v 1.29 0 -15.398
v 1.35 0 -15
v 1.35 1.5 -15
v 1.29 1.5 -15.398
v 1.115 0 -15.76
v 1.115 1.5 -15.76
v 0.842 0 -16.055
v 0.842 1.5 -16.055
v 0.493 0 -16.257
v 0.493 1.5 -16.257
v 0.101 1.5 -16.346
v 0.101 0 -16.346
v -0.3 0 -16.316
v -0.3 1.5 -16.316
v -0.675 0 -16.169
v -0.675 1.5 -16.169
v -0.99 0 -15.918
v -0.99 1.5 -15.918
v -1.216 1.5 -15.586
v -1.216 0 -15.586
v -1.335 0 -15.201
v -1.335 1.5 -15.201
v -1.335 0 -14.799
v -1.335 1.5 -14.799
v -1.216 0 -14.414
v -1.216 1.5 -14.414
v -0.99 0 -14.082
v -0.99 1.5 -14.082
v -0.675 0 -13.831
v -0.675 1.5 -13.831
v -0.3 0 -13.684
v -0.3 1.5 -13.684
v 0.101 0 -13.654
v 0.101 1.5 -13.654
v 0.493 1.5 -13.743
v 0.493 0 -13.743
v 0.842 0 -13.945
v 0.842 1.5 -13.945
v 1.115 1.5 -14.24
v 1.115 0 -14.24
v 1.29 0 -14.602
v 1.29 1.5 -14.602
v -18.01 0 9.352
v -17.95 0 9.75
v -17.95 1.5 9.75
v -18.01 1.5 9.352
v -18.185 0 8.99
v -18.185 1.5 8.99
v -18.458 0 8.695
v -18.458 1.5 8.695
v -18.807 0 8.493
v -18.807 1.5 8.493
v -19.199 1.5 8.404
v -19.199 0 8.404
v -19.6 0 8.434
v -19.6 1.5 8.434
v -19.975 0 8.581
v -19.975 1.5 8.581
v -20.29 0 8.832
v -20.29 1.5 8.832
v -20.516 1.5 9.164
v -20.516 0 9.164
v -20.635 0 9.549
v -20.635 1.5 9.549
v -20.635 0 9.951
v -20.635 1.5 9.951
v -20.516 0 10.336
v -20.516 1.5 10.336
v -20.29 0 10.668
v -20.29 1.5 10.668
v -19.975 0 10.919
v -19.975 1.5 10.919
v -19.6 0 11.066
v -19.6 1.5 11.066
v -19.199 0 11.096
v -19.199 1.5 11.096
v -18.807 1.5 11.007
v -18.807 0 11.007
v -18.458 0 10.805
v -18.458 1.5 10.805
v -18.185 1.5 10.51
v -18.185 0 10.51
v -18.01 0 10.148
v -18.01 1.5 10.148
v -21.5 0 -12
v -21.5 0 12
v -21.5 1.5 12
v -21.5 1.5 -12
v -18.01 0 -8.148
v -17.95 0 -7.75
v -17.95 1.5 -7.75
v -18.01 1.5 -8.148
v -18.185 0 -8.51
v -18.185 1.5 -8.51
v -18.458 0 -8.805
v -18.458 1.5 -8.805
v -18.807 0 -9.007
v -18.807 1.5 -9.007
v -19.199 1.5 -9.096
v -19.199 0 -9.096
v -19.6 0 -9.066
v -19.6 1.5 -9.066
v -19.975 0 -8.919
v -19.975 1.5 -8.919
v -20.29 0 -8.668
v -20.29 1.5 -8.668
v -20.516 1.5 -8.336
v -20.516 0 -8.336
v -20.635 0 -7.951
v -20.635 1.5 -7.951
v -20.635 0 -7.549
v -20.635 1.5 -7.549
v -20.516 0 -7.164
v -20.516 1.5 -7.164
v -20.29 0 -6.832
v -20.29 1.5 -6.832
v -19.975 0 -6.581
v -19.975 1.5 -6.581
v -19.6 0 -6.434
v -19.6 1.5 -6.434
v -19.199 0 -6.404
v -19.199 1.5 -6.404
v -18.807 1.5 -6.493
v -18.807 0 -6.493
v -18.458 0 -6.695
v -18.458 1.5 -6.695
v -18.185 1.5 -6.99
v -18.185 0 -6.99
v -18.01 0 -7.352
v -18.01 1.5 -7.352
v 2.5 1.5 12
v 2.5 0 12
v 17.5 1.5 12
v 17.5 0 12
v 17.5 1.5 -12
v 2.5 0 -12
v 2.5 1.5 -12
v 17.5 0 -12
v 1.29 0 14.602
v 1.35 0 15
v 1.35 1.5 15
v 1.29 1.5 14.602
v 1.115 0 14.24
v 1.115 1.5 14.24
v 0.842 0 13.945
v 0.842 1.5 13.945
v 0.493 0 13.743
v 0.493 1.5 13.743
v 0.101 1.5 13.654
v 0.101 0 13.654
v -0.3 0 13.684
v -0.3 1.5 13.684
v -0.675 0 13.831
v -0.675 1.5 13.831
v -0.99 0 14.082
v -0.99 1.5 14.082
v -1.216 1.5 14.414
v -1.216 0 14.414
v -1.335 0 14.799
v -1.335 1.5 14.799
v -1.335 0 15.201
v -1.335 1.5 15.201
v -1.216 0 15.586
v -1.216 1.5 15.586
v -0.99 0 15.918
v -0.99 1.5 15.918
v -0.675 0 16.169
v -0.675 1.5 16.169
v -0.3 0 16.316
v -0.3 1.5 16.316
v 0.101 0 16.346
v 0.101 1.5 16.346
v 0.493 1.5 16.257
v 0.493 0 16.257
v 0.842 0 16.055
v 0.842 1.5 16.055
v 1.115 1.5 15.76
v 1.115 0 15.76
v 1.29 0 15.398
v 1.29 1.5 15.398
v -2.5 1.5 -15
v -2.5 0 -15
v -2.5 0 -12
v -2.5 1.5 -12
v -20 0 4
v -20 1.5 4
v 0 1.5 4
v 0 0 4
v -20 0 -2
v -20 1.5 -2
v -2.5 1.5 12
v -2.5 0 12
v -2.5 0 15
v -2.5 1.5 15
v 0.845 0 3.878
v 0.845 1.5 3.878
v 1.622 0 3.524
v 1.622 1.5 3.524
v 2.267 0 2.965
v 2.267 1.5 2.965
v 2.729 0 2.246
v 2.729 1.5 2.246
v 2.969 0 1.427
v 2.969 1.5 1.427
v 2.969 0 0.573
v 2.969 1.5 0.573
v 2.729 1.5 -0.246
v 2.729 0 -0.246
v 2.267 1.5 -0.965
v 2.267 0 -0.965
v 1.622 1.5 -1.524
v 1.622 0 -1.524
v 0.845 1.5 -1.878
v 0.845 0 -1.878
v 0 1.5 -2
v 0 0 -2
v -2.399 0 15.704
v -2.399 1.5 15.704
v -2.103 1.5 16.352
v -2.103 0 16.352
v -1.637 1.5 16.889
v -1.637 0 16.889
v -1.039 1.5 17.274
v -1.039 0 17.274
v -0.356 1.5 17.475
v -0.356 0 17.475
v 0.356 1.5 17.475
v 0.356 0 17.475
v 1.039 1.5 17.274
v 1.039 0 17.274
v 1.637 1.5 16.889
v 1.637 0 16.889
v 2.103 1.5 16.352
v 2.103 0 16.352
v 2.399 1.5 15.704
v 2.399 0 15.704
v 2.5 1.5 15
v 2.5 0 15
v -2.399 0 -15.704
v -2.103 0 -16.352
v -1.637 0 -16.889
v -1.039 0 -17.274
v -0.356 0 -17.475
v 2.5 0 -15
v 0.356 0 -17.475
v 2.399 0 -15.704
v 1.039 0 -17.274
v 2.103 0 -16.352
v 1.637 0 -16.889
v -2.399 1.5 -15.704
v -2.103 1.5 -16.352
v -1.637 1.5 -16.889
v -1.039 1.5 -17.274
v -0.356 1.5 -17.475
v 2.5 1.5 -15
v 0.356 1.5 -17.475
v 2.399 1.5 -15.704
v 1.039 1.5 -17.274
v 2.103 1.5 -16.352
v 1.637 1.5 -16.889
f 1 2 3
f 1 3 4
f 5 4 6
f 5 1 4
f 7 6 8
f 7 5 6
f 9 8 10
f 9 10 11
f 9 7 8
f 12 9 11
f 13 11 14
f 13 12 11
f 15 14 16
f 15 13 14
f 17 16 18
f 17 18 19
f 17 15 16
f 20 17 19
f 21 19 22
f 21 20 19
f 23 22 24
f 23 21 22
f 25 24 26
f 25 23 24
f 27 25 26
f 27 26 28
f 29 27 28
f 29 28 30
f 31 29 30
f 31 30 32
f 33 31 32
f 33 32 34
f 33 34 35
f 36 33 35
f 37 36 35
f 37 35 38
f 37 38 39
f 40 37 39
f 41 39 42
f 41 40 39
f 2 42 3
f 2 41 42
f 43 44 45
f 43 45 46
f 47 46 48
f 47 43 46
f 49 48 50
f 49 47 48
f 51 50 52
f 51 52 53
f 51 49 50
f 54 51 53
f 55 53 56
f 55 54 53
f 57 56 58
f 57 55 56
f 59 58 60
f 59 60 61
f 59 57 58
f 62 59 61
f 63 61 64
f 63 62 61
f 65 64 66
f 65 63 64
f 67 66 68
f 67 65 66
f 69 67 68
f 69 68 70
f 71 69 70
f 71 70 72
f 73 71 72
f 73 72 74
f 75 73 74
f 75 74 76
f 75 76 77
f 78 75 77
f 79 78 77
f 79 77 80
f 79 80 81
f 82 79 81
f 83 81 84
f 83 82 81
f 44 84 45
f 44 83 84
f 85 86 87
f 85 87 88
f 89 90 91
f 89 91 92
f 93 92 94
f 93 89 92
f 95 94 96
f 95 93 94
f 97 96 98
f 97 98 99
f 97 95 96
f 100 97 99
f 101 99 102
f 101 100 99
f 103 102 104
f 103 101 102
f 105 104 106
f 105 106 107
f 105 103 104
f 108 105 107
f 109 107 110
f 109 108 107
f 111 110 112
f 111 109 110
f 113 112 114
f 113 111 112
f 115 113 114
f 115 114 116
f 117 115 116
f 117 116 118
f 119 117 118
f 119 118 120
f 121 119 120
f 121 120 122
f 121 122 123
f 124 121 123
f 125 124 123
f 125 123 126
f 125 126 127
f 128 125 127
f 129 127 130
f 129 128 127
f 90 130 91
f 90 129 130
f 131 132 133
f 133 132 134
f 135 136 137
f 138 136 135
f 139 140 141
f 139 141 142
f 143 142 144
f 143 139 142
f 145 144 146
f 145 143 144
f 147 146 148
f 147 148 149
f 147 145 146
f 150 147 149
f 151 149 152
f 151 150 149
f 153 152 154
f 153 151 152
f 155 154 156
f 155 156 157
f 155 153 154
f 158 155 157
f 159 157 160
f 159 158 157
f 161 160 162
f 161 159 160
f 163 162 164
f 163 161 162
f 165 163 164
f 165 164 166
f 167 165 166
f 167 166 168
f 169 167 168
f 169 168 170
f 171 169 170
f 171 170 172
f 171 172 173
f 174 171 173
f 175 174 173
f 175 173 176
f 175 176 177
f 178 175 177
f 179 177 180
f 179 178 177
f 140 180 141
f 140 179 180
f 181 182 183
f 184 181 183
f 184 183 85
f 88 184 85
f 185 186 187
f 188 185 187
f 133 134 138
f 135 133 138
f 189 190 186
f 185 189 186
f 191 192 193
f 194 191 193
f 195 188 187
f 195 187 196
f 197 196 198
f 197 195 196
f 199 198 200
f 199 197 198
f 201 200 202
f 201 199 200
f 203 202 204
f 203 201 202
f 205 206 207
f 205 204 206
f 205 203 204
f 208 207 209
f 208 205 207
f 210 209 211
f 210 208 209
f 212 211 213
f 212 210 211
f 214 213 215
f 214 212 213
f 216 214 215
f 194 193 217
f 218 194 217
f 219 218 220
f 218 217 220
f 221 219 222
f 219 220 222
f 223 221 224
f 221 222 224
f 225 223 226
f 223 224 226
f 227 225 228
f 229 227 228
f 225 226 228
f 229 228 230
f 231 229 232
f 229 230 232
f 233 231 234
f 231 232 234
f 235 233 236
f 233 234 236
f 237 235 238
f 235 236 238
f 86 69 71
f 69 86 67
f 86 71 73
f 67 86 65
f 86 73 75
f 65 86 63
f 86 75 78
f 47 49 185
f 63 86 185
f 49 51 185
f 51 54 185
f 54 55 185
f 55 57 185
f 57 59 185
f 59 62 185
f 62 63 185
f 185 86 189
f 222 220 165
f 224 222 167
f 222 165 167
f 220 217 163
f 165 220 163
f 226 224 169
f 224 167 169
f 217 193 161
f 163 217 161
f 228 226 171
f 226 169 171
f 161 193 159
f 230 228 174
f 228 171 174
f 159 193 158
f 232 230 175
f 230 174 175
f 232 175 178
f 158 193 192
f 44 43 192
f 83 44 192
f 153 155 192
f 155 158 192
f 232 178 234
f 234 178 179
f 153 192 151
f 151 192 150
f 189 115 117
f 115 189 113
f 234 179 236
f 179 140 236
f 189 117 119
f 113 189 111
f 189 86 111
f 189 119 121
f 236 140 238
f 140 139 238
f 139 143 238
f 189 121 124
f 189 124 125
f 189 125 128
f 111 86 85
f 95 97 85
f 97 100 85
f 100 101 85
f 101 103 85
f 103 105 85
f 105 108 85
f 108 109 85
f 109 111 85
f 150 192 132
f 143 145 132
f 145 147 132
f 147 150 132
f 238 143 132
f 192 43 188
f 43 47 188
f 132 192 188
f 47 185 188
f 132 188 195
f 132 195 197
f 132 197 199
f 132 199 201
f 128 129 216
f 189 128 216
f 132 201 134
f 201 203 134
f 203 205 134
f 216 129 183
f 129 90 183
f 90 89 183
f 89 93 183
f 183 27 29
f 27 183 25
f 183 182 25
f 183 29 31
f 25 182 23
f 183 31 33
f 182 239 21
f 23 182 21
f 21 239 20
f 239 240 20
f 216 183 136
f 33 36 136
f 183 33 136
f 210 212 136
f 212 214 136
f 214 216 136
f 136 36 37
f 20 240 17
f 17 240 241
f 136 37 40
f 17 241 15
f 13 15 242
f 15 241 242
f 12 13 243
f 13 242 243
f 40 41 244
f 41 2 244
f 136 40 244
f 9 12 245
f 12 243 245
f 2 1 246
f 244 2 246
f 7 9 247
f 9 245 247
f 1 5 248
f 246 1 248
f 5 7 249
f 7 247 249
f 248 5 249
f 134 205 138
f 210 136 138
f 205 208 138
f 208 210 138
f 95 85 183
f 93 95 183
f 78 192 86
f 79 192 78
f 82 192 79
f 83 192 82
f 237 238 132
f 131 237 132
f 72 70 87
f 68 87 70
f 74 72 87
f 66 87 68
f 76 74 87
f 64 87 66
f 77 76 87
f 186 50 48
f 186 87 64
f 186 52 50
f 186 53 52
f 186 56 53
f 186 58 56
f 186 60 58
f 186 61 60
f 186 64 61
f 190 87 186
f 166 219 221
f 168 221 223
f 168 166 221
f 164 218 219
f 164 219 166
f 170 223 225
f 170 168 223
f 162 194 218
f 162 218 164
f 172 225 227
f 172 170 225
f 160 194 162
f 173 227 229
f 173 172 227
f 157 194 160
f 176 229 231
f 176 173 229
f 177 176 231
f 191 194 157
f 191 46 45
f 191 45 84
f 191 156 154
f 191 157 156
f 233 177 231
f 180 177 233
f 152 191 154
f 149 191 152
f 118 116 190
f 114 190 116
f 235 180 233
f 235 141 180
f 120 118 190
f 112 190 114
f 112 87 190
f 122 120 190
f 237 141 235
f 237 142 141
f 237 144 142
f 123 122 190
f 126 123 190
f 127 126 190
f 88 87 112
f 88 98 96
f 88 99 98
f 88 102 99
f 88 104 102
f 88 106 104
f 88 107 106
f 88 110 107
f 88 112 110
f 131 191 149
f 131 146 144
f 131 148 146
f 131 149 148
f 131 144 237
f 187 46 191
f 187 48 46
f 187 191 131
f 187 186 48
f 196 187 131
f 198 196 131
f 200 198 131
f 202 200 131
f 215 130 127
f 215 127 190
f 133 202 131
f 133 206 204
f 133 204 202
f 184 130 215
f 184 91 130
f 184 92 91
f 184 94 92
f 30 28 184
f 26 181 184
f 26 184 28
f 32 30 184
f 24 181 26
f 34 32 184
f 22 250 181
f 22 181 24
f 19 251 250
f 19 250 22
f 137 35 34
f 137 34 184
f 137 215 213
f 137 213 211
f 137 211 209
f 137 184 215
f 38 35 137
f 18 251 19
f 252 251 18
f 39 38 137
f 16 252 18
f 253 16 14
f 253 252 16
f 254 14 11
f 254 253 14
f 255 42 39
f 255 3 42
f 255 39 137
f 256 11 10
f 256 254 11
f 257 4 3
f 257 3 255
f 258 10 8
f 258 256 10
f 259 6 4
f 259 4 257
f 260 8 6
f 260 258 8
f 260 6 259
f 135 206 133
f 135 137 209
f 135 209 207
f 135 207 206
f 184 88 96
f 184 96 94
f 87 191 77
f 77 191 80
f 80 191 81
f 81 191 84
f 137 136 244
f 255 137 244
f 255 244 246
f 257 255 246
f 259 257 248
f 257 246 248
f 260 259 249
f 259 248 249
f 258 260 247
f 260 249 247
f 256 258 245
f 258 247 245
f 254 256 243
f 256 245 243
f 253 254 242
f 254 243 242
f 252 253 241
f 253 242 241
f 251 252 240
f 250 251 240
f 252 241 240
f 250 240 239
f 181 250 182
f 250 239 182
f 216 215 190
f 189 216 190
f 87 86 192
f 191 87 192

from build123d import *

# Parameters (mm, degrees)
SKETCH1_W           = 35
SKETCH1_H           = 24
SKETCH1_R           = 3
SKETCH1_R_2         = 2.5
SKETCH1_R_3         = 1.35
SKETCH1_W_2         = 4
BOSS_EXTRUDE1_DEPTH = 1.5
CUT_EXTRUDE1_DEPTH  = 10


with BuildPart() as part:
    # Sketch1 → Boss-Extrude1 (new body)
    with BuildSketch(Plane(origin=(0, 0, 0), x_dir=(1, 0, 0), z_dir=(0, 1, 0))):
        Rectangle(SKETCH1_W, SKETCH1_H)
        with Locations((0, -1)):
            Circle(SKETCH1_R, mode=Mode.SUBTRACT)
        with BuildLine():
            Line((2.5, -12), (-2.5, -12))
            Line((-2.5, -12), (-2.5, -15))
            ThreePointArc((-2.5, -15), (0, -12.5), (2.5, -15))
            Line((2.5, -15), (2.5, -12))
        make_face()
        with Locations((0, -15)):
            Circle(SKETCH1_R_2)
        with Locations((0, -15)):
            Circle(SKETCH1_R_3, mode=Mode.SUBTRACT)
        with BuildLine():
            Line((-2.5, 15), (-2.5, 12))
            Line((-2.5, 12), (2.5, 12))
            Line((2.5, 12), (2.5, 15))
            ThreePointArc((2.5, 15), (0, 12.5), (-2.5, 15))
        make_face()
        with Locations((0, 15)):
            Circle(SKETCH1_R_2)
        with Locations((0, 15)):
            Circle(SKETCH1_R_3, mode=Mode.SUBTRACT)
        with Locations((-19.5, 0)):
            Rectangle(SKETCH1_W_2, SKETCH1_H)
        with Locations((-19.3, 7.75)):
            Circle(SKETCH1_R_3, mode=Mode.SUBTRACT)
        with Locations((-19.3, -9.75)):
            Circle(SKETCH1_R_3, mode=Mode.SUBTRACT)
    extrude(amount=BOSS_EXTRUDE1_DEPTH)

    # Sketch2 → Cut-Extrude1 (cut)
    with BuildSketch(Plane(origin=(0, 1.5, 0), x_dir=(1, 0, 0), z_dir=(0, 1, 0))):
        with BuildLine():
            Line((0, 2), (-20, 2))
            Line((-20, 2), (-20, -4))
            Line((-20, -4), (0, -4))
            ThreePointArc((0, -4), (3, -1), (0, 2))
        make_face()
    extrude(amount=-CUT_EXTRUDE1_DEPTH, mode=Mode.SUBTRACT)


solid = part.part
